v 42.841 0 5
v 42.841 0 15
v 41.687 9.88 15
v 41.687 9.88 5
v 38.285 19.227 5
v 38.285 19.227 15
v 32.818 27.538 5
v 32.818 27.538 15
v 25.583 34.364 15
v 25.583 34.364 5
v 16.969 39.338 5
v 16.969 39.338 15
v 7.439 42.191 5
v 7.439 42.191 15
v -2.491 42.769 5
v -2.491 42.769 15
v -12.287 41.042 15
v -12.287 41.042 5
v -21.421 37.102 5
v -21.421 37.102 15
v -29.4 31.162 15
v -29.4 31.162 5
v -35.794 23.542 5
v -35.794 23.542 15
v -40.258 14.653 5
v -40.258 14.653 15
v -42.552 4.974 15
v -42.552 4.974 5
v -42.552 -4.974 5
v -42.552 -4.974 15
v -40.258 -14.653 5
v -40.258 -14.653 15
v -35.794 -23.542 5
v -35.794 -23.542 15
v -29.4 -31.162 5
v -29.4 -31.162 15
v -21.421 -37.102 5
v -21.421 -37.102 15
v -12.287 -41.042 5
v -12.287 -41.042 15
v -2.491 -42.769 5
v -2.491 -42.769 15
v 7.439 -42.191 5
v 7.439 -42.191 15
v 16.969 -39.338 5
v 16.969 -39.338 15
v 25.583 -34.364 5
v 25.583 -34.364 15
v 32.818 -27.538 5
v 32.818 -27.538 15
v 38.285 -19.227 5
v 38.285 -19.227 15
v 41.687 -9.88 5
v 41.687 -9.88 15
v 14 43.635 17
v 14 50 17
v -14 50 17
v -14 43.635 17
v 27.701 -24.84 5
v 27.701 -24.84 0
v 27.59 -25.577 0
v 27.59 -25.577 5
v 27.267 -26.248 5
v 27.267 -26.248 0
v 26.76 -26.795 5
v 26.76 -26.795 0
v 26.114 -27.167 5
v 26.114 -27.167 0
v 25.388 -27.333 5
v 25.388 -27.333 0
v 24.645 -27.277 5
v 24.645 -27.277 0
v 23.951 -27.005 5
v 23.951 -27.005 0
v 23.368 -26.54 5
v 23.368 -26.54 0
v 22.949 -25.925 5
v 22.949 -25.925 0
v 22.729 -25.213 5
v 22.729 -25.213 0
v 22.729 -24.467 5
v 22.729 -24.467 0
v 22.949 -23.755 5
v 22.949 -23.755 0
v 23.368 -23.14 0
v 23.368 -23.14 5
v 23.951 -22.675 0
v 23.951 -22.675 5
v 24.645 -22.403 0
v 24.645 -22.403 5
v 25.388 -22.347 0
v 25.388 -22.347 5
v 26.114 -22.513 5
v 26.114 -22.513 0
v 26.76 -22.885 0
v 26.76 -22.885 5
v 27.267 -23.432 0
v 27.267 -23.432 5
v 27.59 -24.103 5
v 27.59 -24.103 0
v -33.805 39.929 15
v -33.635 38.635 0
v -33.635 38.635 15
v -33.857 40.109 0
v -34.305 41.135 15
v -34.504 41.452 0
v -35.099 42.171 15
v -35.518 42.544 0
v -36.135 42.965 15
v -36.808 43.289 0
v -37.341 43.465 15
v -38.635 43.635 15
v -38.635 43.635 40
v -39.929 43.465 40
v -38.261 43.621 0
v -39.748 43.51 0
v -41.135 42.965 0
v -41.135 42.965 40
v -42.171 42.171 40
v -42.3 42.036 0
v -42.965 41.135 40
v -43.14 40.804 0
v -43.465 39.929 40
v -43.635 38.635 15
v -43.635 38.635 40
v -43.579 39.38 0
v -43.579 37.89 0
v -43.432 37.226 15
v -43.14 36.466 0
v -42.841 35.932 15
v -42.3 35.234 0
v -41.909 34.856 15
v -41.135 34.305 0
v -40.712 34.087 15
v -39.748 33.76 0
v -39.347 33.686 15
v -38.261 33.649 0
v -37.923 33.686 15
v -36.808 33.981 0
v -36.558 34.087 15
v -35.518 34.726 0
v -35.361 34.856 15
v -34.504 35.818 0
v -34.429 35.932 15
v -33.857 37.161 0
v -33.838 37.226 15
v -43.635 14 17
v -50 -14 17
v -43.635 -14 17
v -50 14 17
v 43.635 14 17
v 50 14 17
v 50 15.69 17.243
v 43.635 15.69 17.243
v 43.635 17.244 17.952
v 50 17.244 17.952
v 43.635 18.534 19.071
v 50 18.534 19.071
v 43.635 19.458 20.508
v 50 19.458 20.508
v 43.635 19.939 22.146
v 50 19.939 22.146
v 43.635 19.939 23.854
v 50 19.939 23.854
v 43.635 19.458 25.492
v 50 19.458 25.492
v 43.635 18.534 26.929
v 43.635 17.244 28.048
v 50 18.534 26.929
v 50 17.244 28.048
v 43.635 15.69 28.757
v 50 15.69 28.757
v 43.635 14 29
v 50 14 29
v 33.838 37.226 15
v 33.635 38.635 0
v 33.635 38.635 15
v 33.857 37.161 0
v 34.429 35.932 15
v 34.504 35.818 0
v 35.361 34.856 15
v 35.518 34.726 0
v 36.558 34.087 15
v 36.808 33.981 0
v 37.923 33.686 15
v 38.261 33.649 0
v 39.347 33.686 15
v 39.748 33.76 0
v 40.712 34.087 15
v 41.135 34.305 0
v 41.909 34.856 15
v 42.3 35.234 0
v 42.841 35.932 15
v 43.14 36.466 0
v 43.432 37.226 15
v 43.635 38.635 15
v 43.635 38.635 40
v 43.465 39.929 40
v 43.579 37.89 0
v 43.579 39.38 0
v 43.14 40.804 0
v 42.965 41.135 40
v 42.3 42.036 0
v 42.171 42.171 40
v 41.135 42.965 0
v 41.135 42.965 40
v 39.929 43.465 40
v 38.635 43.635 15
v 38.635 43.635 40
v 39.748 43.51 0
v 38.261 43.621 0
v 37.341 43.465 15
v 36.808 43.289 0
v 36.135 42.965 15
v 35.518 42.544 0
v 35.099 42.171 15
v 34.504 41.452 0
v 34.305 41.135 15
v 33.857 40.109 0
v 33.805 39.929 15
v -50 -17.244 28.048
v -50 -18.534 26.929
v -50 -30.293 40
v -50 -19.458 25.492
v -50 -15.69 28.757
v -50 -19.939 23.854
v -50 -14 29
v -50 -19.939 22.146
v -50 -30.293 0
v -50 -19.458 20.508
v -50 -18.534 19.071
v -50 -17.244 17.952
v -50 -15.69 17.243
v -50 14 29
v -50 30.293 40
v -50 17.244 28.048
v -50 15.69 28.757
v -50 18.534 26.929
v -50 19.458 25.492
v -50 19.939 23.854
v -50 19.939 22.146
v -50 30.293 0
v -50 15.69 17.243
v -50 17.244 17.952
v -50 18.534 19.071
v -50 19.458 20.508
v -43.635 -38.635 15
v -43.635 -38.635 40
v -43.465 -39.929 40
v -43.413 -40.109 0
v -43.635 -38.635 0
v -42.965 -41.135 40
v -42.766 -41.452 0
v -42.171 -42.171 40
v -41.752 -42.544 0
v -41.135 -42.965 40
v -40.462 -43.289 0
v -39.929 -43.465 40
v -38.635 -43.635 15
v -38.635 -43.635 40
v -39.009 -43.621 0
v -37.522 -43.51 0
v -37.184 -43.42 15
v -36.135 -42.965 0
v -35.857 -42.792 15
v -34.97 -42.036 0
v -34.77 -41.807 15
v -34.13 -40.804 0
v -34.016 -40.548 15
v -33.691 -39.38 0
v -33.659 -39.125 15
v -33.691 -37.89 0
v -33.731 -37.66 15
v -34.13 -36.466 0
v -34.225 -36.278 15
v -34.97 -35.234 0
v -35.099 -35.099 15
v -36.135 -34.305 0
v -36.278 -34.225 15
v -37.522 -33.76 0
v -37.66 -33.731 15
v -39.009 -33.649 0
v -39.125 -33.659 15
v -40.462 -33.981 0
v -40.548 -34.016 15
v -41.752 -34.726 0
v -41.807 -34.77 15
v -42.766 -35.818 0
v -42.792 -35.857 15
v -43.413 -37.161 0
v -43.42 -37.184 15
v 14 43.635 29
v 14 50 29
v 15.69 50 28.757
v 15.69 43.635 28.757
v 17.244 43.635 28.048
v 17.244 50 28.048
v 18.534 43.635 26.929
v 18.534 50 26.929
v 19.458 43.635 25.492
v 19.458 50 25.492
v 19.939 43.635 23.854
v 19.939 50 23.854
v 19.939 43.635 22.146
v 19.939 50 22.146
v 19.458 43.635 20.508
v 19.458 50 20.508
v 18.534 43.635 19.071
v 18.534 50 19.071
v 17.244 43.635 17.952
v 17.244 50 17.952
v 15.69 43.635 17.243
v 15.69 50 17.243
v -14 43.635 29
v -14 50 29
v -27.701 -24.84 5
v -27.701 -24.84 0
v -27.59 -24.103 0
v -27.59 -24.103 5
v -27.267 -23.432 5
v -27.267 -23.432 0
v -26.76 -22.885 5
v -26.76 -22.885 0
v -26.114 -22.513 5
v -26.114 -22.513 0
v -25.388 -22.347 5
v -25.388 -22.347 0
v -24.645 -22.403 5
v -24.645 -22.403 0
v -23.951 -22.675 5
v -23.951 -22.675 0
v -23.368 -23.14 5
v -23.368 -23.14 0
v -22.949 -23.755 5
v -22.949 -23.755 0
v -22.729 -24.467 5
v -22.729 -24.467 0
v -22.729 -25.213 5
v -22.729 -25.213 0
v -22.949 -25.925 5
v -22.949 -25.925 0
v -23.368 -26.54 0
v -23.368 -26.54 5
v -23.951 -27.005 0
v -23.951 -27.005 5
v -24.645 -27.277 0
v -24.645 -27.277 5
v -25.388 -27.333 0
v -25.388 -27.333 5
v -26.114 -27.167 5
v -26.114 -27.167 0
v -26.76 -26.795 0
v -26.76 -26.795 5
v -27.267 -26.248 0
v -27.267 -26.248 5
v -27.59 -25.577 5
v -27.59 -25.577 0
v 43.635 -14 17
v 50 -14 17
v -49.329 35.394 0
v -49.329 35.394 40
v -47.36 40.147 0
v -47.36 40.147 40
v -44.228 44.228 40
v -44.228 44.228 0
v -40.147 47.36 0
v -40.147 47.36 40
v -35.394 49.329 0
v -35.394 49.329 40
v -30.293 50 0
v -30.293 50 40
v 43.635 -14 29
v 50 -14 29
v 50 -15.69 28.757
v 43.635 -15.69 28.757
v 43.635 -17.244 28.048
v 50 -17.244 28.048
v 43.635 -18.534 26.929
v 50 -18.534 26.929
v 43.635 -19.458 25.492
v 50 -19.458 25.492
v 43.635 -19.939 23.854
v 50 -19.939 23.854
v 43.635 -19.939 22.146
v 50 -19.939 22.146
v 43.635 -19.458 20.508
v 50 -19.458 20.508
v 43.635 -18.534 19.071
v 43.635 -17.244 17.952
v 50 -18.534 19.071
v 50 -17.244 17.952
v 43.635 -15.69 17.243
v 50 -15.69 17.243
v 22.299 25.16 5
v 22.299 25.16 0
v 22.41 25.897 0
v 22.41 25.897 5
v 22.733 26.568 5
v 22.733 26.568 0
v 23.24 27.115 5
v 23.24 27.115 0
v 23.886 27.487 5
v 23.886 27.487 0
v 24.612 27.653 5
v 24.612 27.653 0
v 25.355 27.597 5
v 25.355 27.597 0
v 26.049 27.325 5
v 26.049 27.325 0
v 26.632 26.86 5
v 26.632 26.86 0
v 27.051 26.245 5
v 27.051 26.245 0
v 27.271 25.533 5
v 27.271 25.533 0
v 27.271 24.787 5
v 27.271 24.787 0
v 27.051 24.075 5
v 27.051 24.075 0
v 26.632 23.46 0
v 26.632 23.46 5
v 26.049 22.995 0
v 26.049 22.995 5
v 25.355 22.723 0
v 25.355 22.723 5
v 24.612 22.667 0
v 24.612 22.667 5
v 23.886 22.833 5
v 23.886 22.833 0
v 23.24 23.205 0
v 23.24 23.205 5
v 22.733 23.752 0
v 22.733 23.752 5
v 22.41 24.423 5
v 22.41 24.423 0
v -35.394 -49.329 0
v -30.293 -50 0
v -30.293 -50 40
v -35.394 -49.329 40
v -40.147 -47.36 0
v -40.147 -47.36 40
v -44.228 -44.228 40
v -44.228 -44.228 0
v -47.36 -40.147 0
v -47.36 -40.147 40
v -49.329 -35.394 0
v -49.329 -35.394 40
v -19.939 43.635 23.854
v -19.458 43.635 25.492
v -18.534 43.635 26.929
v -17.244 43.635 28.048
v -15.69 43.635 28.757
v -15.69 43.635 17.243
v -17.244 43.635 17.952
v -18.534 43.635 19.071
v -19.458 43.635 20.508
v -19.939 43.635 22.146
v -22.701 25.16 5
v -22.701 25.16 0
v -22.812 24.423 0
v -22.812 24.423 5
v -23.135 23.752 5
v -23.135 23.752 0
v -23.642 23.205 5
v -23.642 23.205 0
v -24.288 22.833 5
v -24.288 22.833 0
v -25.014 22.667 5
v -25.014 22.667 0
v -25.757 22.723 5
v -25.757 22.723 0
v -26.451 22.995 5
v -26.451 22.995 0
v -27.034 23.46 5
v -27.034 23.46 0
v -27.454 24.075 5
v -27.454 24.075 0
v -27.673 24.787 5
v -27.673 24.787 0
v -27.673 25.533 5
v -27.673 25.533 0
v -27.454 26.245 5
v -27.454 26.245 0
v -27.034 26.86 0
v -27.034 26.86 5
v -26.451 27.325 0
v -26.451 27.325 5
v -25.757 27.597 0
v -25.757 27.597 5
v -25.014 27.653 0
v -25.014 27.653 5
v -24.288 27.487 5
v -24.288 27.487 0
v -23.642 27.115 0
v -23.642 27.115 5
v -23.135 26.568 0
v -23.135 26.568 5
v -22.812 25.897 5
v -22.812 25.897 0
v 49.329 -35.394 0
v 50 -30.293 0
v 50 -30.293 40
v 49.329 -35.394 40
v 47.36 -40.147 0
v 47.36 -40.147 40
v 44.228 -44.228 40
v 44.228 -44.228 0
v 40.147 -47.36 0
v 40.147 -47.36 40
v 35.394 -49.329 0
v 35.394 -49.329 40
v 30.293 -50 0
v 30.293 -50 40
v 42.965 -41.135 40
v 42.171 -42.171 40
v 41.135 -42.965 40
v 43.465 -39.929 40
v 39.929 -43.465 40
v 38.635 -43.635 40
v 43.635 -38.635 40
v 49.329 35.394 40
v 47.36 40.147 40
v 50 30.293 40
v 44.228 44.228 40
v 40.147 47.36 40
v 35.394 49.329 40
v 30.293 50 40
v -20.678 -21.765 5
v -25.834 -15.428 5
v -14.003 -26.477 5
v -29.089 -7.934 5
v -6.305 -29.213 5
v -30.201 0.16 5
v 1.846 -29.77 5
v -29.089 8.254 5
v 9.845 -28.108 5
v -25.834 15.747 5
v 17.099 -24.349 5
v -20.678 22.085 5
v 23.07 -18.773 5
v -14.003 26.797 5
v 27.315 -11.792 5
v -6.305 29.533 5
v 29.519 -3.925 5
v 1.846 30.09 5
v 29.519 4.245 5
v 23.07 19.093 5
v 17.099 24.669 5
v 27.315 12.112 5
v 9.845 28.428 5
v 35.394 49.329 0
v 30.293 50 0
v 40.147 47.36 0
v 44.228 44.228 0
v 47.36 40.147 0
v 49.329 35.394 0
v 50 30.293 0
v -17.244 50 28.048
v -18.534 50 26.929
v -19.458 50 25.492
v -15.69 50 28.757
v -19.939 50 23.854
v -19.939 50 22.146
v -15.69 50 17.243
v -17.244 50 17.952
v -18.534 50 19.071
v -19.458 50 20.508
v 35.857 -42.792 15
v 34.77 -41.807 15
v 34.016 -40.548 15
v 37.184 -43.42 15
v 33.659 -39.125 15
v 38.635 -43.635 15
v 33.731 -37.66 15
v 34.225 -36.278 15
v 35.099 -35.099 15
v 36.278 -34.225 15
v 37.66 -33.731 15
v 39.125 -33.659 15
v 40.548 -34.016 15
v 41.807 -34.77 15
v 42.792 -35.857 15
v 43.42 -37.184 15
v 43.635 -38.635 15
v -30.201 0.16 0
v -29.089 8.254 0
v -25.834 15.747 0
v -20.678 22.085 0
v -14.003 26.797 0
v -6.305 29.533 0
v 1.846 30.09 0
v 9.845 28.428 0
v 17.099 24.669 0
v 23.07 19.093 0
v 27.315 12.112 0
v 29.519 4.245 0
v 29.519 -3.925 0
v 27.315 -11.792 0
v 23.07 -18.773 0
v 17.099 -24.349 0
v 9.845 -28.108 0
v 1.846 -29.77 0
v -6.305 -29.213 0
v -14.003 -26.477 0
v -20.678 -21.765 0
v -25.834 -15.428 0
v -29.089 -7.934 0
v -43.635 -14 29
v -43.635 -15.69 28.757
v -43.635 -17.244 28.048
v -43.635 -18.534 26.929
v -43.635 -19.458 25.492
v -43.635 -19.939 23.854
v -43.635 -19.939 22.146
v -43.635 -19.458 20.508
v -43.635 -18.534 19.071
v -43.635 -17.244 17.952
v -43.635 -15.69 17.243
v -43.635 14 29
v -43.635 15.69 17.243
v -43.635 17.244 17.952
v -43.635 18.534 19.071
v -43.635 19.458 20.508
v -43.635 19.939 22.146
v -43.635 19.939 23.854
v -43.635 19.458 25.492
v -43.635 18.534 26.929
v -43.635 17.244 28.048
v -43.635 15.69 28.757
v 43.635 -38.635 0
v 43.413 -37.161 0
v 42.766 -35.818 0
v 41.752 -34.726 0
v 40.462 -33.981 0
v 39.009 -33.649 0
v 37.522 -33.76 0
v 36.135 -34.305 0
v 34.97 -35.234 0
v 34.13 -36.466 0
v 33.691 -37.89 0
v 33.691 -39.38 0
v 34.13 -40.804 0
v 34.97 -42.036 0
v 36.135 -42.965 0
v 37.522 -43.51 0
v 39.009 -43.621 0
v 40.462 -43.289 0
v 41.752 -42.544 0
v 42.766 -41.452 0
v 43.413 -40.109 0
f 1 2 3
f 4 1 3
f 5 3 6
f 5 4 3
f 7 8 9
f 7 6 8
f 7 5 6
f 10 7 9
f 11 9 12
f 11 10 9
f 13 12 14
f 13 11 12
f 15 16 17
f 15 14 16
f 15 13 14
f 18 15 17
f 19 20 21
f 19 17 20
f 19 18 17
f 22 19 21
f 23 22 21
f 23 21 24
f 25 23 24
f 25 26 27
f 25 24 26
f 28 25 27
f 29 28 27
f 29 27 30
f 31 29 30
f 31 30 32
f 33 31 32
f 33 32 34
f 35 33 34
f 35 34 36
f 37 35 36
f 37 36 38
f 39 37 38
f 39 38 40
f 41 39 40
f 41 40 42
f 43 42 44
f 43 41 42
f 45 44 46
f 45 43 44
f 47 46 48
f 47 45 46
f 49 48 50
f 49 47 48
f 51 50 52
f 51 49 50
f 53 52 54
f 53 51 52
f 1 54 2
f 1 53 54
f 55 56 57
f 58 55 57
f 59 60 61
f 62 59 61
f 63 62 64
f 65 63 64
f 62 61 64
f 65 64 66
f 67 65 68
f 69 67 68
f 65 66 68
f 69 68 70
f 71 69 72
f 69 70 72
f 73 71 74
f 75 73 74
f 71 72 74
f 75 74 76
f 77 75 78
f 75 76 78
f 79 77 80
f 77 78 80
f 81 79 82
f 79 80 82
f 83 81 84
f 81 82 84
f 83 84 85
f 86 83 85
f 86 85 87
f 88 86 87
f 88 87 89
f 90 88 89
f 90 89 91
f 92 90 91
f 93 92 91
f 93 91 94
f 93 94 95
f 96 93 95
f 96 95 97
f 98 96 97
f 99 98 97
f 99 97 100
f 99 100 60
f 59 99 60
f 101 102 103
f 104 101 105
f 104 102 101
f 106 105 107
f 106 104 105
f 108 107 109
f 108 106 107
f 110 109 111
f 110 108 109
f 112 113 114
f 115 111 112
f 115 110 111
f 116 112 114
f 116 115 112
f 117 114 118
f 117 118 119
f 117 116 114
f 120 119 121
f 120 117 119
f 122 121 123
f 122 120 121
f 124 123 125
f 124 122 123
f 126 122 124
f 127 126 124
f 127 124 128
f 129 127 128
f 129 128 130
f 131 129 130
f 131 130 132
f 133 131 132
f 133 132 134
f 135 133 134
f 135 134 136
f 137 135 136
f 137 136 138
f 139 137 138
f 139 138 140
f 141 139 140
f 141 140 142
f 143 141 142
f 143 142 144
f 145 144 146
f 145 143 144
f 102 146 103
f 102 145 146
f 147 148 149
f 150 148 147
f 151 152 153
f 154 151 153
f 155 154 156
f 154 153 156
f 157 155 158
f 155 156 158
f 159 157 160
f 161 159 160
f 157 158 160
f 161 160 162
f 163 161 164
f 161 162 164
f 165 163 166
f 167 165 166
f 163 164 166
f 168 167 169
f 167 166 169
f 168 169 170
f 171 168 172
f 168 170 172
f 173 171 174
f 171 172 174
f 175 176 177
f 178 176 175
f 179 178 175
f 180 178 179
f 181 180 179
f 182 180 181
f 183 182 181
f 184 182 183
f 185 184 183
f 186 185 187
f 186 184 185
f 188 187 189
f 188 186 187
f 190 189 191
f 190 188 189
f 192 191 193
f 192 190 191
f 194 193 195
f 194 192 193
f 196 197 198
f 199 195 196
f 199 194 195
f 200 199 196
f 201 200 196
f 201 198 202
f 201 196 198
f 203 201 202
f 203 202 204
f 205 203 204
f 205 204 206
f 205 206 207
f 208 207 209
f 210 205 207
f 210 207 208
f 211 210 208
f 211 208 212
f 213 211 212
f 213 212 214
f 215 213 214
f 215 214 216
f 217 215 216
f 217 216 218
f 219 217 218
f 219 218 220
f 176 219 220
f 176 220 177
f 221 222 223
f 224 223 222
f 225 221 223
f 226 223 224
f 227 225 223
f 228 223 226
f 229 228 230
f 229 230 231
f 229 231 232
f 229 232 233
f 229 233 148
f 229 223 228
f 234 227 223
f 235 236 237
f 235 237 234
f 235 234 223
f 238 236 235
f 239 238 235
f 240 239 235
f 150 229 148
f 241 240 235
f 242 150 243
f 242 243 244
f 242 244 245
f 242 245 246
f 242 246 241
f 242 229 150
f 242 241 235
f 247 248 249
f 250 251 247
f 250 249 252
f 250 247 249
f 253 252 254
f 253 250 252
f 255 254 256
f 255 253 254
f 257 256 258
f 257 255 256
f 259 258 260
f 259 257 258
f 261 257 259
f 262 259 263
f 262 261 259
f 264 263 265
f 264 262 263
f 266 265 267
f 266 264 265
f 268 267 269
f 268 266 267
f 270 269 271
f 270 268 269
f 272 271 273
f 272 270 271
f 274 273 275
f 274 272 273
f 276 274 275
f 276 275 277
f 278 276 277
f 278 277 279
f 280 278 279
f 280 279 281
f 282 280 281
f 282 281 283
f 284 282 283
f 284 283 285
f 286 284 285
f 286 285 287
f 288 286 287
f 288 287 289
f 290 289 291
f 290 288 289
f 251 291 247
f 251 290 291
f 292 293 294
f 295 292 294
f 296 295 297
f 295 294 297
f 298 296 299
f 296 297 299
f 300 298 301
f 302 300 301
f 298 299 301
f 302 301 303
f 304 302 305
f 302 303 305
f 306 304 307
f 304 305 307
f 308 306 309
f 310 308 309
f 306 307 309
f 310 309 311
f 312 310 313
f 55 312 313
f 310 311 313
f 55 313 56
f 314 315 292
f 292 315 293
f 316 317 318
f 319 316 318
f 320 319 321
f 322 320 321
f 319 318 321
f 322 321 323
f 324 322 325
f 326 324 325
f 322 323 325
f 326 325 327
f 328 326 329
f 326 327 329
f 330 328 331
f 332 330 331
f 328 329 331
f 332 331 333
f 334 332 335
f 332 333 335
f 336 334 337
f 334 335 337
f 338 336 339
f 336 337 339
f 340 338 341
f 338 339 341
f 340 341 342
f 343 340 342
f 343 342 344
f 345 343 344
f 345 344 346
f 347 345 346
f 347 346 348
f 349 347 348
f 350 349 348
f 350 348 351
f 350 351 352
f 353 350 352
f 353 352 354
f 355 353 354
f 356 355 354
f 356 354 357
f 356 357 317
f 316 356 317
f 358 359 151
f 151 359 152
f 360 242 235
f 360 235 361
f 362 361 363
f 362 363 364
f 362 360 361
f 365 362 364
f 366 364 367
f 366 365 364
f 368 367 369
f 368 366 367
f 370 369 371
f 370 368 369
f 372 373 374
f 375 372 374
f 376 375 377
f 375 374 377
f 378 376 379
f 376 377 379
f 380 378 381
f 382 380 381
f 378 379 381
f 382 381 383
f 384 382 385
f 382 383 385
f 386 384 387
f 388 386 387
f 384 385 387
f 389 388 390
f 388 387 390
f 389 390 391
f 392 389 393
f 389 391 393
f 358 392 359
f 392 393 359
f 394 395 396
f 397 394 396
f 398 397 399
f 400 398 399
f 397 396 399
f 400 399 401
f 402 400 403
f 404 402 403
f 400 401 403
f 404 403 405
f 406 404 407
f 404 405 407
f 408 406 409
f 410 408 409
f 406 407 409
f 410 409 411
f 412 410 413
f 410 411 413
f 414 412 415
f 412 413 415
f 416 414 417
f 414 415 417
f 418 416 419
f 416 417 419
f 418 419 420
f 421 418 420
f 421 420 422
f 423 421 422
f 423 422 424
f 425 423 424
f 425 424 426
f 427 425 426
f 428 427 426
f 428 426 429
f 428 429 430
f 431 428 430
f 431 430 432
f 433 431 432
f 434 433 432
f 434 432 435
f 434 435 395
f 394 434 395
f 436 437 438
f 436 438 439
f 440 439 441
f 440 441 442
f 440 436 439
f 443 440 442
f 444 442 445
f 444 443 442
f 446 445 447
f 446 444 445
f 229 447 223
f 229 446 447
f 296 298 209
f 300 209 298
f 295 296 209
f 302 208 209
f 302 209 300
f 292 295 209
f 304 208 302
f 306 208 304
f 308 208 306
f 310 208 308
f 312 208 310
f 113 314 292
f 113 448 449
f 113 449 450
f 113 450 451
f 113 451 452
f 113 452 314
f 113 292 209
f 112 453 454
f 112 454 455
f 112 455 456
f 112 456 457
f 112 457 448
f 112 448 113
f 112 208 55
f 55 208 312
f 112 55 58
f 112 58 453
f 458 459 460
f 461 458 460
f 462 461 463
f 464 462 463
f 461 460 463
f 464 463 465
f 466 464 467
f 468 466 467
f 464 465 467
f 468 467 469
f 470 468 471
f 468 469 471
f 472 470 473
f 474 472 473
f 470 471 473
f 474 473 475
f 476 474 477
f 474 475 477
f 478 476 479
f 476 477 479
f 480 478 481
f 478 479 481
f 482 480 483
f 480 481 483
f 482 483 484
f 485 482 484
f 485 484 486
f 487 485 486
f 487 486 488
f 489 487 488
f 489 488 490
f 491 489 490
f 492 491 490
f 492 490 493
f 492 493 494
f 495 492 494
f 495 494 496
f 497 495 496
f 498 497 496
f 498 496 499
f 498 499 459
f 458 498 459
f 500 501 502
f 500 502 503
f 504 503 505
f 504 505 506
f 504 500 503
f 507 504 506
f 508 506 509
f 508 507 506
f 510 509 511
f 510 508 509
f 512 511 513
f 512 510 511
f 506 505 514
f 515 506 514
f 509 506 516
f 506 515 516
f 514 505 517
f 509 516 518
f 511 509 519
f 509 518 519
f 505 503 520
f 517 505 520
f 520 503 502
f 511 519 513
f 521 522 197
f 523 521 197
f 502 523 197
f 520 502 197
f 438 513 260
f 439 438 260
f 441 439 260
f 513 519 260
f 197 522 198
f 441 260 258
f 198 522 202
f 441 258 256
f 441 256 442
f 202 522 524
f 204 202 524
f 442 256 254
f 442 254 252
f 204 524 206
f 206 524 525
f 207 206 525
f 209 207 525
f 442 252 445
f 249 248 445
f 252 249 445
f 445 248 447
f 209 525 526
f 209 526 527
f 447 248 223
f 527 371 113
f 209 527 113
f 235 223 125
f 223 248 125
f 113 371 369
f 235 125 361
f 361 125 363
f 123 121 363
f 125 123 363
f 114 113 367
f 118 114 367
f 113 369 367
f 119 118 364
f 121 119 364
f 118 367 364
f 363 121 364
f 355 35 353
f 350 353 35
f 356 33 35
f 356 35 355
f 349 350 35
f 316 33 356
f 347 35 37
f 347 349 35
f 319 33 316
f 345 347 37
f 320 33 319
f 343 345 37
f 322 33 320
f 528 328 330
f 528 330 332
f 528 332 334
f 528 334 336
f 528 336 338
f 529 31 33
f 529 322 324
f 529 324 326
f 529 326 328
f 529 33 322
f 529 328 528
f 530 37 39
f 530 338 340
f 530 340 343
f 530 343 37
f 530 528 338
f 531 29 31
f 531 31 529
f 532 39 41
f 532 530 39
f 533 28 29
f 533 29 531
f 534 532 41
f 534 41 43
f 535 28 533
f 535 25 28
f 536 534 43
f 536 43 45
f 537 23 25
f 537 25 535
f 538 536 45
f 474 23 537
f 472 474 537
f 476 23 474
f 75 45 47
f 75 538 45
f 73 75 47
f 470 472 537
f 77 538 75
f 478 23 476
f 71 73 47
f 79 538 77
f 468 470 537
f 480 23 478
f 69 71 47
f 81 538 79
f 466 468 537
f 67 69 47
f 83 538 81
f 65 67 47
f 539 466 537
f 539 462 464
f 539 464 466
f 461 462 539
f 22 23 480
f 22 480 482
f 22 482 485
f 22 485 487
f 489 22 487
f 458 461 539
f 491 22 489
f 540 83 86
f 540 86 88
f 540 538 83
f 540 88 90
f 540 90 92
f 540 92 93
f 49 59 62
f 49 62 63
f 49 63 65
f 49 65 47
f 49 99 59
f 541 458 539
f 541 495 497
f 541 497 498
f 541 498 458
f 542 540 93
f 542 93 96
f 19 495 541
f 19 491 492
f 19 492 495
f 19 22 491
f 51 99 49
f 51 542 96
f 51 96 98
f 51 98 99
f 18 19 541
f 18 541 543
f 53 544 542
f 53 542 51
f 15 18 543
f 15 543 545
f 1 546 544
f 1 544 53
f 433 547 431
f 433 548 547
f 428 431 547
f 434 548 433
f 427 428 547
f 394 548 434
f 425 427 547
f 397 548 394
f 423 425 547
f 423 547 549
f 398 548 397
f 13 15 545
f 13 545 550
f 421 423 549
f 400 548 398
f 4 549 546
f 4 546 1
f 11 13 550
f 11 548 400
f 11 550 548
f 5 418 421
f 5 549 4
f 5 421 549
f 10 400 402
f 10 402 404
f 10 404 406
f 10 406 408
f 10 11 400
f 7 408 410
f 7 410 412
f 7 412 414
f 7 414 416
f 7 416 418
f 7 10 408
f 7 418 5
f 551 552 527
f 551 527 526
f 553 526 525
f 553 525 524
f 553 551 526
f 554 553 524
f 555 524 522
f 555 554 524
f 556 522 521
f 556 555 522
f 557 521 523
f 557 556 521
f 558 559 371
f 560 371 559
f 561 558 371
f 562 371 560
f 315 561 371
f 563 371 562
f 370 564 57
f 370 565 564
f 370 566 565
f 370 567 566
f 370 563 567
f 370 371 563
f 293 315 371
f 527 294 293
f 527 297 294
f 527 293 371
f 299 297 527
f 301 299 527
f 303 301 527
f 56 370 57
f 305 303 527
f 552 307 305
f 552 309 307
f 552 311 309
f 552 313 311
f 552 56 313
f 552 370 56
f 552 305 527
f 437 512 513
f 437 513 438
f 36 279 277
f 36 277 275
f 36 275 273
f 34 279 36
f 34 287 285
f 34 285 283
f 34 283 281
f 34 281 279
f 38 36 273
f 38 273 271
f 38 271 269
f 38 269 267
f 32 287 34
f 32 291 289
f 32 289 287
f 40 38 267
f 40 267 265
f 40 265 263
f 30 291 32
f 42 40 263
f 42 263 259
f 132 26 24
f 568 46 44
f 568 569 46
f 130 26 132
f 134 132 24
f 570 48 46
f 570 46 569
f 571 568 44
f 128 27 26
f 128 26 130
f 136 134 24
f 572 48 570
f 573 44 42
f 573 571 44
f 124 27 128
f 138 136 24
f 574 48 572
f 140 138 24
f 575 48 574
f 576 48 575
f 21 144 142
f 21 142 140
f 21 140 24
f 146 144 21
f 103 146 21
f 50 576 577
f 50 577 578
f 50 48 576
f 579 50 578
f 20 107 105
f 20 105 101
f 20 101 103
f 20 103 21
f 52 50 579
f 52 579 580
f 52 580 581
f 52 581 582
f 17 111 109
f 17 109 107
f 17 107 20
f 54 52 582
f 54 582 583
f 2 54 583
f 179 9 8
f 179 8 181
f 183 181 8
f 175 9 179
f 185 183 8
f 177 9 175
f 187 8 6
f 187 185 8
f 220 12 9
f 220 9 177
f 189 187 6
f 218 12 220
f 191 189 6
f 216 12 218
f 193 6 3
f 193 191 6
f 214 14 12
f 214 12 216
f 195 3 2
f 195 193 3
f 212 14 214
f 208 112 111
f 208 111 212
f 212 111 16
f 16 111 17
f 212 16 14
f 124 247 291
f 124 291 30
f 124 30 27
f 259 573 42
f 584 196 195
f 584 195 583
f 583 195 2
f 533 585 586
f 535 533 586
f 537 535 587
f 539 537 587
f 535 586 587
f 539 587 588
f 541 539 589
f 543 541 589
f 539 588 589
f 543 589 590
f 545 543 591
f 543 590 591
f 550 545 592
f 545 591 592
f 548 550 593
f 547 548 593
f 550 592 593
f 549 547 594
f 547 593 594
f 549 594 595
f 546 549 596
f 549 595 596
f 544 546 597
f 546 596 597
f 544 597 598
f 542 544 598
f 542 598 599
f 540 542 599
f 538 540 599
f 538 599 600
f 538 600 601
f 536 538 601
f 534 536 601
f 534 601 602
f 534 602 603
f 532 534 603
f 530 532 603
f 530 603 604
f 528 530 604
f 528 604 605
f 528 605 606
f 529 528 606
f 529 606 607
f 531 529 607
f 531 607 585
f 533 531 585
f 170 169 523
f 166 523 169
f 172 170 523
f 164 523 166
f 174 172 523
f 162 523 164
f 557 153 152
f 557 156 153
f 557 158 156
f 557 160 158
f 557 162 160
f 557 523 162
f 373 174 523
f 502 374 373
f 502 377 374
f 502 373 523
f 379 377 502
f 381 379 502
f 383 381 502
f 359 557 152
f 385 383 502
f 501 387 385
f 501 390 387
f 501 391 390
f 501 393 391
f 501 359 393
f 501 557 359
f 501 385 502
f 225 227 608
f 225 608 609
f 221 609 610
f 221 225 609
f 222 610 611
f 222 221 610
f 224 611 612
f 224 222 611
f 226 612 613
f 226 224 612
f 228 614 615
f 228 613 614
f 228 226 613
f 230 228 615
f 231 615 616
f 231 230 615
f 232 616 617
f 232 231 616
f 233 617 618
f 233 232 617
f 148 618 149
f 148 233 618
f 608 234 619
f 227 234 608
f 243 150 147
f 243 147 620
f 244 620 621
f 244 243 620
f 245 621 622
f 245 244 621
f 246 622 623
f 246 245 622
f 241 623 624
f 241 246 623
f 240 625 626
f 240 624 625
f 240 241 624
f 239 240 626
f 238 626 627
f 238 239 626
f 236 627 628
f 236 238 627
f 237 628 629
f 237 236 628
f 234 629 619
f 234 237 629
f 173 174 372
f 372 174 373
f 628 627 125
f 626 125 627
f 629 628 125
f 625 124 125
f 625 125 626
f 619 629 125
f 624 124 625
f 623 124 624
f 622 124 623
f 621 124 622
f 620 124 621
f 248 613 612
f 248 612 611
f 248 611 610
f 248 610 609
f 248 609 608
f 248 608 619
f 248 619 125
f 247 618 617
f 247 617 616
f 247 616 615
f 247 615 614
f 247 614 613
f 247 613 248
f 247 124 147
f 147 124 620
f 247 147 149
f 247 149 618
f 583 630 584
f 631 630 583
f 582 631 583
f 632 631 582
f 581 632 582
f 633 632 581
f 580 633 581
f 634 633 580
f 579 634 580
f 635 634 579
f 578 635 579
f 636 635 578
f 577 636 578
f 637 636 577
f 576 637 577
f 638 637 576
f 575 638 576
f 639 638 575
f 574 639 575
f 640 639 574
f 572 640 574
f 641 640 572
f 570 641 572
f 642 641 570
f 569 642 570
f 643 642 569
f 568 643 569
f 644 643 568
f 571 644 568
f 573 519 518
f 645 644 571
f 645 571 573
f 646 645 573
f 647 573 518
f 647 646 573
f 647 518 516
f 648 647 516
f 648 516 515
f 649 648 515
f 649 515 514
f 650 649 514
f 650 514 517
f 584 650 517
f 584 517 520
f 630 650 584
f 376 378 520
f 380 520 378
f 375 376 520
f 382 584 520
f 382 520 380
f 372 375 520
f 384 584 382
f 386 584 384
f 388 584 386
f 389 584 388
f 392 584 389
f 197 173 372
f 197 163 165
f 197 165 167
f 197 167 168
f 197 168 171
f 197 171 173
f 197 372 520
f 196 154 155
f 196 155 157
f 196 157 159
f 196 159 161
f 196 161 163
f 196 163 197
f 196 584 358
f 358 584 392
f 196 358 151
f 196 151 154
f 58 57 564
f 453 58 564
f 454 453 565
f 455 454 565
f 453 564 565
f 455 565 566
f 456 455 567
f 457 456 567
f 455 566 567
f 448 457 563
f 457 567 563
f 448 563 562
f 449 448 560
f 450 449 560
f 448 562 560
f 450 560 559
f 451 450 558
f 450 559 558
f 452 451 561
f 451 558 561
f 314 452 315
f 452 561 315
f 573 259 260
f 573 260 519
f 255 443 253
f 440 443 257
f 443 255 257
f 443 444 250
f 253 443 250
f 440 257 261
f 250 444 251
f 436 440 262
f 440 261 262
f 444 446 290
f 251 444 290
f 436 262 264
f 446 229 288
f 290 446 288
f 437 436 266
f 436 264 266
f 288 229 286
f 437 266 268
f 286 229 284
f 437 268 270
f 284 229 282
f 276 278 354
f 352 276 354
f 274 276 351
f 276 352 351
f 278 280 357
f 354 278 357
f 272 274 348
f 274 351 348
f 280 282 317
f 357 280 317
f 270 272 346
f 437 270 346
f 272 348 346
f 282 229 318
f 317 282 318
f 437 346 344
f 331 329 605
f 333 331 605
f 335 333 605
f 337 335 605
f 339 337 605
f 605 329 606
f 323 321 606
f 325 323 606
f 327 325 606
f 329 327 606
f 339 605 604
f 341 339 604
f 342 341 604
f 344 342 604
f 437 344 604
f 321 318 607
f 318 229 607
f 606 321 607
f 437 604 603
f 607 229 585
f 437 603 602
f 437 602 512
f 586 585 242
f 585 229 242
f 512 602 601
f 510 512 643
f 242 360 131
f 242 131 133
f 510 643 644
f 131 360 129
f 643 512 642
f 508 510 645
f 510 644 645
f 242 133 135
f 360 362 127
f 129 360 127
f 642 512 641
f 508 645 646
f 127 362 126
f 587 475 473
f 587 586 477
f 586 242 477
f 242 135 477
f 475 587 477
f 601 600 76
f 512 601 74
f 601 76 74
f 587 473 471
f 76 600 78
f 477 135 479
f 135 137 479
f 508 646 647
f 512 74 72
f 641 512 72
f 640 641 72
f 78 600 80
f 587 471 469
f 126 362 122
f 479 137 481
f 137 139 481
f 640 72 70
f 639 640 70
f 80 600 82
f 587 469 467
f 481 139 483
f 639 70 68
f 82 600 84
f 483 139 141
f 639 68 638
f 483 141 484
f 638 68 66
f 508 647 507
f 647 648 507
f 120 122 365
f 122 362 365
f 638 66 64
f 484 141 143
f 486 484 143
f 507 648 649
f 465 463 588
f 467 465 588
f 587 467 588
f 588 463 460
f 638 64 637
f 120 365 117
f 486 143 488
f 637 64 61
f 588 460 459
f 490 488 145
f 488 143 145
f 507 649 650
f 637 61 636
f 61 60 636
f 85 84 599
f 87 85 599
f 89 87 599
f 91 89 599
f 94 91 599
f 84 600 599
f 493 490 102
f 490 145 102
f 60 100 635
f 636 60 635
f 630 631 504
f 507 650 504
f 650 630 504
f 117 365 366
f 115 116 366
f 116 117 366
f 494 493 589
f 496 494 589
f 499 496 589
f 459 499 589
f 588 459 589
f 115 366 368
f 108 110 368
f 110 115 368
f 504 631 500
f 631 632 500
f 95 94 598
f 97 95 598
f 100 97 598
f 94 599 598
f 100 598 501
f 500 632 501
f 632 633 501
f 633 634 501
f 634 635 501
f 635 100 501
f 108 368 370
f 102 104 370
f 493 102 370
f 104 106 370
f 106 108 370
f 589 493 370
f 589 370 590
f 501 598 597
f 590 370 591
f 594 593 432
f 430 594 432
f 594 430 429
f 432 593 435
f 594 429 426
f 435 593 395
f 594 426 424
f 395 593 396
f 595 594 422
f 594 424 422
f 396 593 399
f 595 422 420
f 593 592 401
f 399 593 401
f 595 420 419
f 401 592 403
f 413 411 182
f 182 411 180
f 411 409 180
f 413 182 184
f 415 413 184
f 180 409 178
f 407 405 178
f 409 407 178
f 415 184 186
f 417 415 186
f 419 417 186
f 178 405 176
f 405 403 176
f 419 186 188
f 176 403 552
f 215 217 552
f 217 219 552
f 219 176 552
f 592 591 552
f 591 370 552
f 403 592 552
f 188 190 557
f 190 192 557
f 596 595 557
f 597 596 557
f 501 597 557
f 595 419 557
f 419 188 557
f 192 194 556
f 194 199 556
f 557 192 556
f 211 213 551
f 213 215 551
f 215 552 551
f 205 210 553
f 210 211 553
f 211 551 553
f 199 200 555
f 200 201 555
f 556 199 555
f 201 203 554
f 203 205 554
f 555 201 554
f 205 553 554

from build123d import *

# Parameters (mm, degrees)
SKETCH_1_R          = 5
SKETCH_1_R_2        = 42.84145639
EXTRUDE_2_DEPTH     = 40
SKETCH_1_5_R        = 42.84145639
EXTRUDE_3_DEPTH     = 5
CUT_EXTRUDE_START   = 25
CUT_EXTRUDE_2_DEPTH = 25
SKETCH_5_R          = 30
SKETCH_5_R_2        = 2.5
CUT_EXTRUDE_3_DEPTH = 82.240384046
CUT_EXTRUDE_4_DEPTH = 10


with BuildPart() as part:
    # 草图1 → 凸台-拉伸2 (new body)
    with BuildSketch(Plane.XY):
        with BuildLine():
            Line((-30.293484329, 50), (30.293484329, 50))
            ThreePointArc((30.293484329, 50), (44.228095194, 44.228095194), (50, 30.293484329))
            Line((50, 30.293484329), (50, -30.293484329))
            ThreePointArc((50, -30.293484329), (44.228095194, -44.228095194), (30.293484329, -50))
            Line((30.293484329, -50), (-30.293484329, -50))
            ThreePointArc((-30.293484329, -50), (-44.228095194, -44.228095194), (-50, -30.293484329))
            Line((-50, -30.293484329), (-50, 30.293484329))
            ThreePointArc((-50, 30.293484329), (-44.228095194, 44.228095194), (-30.293484329, 50))
        make_face()
        with Locations((-38.635004029, 38.635004029)):
            Circle(SKETCH_1_R, mode=Mode.SUBTRACT)
        with Locations((38.635004029, 38.635004029)):
            Circle(SKETCH_1_R, mode=Mode.SUBTRACT)
        with Locations((38.635004029, -38.635004029)):
            Circle(SKETCH_1_R, mode=Mode.SUBTRACT)
        with Locations((-38.635004029, -38.635004029)):
            Circle(SKETCH_1_R, mode=Mode.SUBTRACT)
        Circle(SKETCH_1_R_2, mode=Mode.SUBTRACT)
    extrude(amount=EXTRUDE_2_DEPTH)

    # 草图1<5> → 凸台-拉伸3 (add)
    with BuildSketch(Plane.XY):
        Circle(SKETCH_1_5_R)
    extrude(amount=EXTRUDE_3_DEPTH)

    # 草图4 → 切除-拉伸2 (cut)
    with BuildSketch(Plane(origin=(0, 0, 40), x_dir=(-1, 0, 0), z_dir=(0, 0, -1)).offset(CUT_EXTRUDE_START)):
        with BuildLine():
            Line((-38.635004029, 43.635004029), (38.635004029, 43.635004029))
            ThreePointArc((38.635004029, 43.635004029), (42.170537935, 42.170537935), (43.635004029, 38.635004029))
            Line((43.635004029, 38.635004029), (43.635004029, -38.635004029))
            ThreePointArc((43.635004029, -38.635004029), (42.170537935, -42.170537935), (38.635004029, -43.635004029))
            Line((38.635004029, -43.635004029), (-38.635004029, -43.635004029))
            ThreePointArc((-38.635004029, -43.635004029), (-42.170537935, -42.170537935), (-43.635004029, -38.635004029))
            Line((-43.635004029, -38.635004029), (-43.635004029, 38.635004029))
            ThreePointArc((-43.635004029, 38.635004029), (-42.170537935, 42.170537935), (-38.635004029, 43.635004029))
        make_face()
    extrude(amount=-CUT_EXTRUDE_2_DEPTH, mode=Mode.SUBTRACT)

    # 草图5 → 切除-拉伸3 (cut, through all)
    with BuildSketch(Plane(origin=(0, 0, 0), x_dir=(-1, 0, 0), z_dir=(0, 0, -1))):
        with Locations((0.201090543, 0.15997854)):
            Circle(SKETCH_5_R)
        with Locations((-24.798909457, 25.15997854)):
            Circle(SKETCH_5_R_2)
        with Locations((25.201090543, 25.15997854)):
            Circle(SKETCH_5_R_2)
        with Locations((25.201090543, -24.84002146)):
            Circle(SKETCH_5_R_2)
        with Locations((-25.201090543, -24.84002146)):
            Circle(SKETCH_5_R_2)
    extrude(amount=-CUT_EXTRUDE_3_DEPTH, mode=Mode.SUBTRACT)

    # 草图7 → 切除-拉伸4 (cut)
    with BuildSketch(Plane.ZY.offset(50)):
        with BuildLine():
            Line((29, 14), (29, -14))
            ThreePointArc((29, -14), (23, -20), (17, -14))
            Line((17, -14), (17, 14))
            ThreePointArc((17, 14), (23, 20), (29, 14))
        make_face()
    cut_extrude_4 = extrude(amount=-CUT_EXTRUDE_4_DEPTH, mode=Mode.SUBTRACT)

    # 镜向1: 切除-拉伸4 across plane
    add(cut_extrude_4.mirror(Plane(origin=(0, 0, 0), x_dir=(0, 0, 1), z_dir=(1, 0, 0))), mode=Mode.SUBTRACT)

    # 镜向2: 切除-拉伸4 across plane
    add(cut_extrude_4.mirror(Plane(origin=(0, 0, 0), x_dir=(0, 0, 1), z_dir=(0.7071067811865475, 0.7071067811865477, 0))), mode=Mode.SUBTRACT)


solid = part.part
